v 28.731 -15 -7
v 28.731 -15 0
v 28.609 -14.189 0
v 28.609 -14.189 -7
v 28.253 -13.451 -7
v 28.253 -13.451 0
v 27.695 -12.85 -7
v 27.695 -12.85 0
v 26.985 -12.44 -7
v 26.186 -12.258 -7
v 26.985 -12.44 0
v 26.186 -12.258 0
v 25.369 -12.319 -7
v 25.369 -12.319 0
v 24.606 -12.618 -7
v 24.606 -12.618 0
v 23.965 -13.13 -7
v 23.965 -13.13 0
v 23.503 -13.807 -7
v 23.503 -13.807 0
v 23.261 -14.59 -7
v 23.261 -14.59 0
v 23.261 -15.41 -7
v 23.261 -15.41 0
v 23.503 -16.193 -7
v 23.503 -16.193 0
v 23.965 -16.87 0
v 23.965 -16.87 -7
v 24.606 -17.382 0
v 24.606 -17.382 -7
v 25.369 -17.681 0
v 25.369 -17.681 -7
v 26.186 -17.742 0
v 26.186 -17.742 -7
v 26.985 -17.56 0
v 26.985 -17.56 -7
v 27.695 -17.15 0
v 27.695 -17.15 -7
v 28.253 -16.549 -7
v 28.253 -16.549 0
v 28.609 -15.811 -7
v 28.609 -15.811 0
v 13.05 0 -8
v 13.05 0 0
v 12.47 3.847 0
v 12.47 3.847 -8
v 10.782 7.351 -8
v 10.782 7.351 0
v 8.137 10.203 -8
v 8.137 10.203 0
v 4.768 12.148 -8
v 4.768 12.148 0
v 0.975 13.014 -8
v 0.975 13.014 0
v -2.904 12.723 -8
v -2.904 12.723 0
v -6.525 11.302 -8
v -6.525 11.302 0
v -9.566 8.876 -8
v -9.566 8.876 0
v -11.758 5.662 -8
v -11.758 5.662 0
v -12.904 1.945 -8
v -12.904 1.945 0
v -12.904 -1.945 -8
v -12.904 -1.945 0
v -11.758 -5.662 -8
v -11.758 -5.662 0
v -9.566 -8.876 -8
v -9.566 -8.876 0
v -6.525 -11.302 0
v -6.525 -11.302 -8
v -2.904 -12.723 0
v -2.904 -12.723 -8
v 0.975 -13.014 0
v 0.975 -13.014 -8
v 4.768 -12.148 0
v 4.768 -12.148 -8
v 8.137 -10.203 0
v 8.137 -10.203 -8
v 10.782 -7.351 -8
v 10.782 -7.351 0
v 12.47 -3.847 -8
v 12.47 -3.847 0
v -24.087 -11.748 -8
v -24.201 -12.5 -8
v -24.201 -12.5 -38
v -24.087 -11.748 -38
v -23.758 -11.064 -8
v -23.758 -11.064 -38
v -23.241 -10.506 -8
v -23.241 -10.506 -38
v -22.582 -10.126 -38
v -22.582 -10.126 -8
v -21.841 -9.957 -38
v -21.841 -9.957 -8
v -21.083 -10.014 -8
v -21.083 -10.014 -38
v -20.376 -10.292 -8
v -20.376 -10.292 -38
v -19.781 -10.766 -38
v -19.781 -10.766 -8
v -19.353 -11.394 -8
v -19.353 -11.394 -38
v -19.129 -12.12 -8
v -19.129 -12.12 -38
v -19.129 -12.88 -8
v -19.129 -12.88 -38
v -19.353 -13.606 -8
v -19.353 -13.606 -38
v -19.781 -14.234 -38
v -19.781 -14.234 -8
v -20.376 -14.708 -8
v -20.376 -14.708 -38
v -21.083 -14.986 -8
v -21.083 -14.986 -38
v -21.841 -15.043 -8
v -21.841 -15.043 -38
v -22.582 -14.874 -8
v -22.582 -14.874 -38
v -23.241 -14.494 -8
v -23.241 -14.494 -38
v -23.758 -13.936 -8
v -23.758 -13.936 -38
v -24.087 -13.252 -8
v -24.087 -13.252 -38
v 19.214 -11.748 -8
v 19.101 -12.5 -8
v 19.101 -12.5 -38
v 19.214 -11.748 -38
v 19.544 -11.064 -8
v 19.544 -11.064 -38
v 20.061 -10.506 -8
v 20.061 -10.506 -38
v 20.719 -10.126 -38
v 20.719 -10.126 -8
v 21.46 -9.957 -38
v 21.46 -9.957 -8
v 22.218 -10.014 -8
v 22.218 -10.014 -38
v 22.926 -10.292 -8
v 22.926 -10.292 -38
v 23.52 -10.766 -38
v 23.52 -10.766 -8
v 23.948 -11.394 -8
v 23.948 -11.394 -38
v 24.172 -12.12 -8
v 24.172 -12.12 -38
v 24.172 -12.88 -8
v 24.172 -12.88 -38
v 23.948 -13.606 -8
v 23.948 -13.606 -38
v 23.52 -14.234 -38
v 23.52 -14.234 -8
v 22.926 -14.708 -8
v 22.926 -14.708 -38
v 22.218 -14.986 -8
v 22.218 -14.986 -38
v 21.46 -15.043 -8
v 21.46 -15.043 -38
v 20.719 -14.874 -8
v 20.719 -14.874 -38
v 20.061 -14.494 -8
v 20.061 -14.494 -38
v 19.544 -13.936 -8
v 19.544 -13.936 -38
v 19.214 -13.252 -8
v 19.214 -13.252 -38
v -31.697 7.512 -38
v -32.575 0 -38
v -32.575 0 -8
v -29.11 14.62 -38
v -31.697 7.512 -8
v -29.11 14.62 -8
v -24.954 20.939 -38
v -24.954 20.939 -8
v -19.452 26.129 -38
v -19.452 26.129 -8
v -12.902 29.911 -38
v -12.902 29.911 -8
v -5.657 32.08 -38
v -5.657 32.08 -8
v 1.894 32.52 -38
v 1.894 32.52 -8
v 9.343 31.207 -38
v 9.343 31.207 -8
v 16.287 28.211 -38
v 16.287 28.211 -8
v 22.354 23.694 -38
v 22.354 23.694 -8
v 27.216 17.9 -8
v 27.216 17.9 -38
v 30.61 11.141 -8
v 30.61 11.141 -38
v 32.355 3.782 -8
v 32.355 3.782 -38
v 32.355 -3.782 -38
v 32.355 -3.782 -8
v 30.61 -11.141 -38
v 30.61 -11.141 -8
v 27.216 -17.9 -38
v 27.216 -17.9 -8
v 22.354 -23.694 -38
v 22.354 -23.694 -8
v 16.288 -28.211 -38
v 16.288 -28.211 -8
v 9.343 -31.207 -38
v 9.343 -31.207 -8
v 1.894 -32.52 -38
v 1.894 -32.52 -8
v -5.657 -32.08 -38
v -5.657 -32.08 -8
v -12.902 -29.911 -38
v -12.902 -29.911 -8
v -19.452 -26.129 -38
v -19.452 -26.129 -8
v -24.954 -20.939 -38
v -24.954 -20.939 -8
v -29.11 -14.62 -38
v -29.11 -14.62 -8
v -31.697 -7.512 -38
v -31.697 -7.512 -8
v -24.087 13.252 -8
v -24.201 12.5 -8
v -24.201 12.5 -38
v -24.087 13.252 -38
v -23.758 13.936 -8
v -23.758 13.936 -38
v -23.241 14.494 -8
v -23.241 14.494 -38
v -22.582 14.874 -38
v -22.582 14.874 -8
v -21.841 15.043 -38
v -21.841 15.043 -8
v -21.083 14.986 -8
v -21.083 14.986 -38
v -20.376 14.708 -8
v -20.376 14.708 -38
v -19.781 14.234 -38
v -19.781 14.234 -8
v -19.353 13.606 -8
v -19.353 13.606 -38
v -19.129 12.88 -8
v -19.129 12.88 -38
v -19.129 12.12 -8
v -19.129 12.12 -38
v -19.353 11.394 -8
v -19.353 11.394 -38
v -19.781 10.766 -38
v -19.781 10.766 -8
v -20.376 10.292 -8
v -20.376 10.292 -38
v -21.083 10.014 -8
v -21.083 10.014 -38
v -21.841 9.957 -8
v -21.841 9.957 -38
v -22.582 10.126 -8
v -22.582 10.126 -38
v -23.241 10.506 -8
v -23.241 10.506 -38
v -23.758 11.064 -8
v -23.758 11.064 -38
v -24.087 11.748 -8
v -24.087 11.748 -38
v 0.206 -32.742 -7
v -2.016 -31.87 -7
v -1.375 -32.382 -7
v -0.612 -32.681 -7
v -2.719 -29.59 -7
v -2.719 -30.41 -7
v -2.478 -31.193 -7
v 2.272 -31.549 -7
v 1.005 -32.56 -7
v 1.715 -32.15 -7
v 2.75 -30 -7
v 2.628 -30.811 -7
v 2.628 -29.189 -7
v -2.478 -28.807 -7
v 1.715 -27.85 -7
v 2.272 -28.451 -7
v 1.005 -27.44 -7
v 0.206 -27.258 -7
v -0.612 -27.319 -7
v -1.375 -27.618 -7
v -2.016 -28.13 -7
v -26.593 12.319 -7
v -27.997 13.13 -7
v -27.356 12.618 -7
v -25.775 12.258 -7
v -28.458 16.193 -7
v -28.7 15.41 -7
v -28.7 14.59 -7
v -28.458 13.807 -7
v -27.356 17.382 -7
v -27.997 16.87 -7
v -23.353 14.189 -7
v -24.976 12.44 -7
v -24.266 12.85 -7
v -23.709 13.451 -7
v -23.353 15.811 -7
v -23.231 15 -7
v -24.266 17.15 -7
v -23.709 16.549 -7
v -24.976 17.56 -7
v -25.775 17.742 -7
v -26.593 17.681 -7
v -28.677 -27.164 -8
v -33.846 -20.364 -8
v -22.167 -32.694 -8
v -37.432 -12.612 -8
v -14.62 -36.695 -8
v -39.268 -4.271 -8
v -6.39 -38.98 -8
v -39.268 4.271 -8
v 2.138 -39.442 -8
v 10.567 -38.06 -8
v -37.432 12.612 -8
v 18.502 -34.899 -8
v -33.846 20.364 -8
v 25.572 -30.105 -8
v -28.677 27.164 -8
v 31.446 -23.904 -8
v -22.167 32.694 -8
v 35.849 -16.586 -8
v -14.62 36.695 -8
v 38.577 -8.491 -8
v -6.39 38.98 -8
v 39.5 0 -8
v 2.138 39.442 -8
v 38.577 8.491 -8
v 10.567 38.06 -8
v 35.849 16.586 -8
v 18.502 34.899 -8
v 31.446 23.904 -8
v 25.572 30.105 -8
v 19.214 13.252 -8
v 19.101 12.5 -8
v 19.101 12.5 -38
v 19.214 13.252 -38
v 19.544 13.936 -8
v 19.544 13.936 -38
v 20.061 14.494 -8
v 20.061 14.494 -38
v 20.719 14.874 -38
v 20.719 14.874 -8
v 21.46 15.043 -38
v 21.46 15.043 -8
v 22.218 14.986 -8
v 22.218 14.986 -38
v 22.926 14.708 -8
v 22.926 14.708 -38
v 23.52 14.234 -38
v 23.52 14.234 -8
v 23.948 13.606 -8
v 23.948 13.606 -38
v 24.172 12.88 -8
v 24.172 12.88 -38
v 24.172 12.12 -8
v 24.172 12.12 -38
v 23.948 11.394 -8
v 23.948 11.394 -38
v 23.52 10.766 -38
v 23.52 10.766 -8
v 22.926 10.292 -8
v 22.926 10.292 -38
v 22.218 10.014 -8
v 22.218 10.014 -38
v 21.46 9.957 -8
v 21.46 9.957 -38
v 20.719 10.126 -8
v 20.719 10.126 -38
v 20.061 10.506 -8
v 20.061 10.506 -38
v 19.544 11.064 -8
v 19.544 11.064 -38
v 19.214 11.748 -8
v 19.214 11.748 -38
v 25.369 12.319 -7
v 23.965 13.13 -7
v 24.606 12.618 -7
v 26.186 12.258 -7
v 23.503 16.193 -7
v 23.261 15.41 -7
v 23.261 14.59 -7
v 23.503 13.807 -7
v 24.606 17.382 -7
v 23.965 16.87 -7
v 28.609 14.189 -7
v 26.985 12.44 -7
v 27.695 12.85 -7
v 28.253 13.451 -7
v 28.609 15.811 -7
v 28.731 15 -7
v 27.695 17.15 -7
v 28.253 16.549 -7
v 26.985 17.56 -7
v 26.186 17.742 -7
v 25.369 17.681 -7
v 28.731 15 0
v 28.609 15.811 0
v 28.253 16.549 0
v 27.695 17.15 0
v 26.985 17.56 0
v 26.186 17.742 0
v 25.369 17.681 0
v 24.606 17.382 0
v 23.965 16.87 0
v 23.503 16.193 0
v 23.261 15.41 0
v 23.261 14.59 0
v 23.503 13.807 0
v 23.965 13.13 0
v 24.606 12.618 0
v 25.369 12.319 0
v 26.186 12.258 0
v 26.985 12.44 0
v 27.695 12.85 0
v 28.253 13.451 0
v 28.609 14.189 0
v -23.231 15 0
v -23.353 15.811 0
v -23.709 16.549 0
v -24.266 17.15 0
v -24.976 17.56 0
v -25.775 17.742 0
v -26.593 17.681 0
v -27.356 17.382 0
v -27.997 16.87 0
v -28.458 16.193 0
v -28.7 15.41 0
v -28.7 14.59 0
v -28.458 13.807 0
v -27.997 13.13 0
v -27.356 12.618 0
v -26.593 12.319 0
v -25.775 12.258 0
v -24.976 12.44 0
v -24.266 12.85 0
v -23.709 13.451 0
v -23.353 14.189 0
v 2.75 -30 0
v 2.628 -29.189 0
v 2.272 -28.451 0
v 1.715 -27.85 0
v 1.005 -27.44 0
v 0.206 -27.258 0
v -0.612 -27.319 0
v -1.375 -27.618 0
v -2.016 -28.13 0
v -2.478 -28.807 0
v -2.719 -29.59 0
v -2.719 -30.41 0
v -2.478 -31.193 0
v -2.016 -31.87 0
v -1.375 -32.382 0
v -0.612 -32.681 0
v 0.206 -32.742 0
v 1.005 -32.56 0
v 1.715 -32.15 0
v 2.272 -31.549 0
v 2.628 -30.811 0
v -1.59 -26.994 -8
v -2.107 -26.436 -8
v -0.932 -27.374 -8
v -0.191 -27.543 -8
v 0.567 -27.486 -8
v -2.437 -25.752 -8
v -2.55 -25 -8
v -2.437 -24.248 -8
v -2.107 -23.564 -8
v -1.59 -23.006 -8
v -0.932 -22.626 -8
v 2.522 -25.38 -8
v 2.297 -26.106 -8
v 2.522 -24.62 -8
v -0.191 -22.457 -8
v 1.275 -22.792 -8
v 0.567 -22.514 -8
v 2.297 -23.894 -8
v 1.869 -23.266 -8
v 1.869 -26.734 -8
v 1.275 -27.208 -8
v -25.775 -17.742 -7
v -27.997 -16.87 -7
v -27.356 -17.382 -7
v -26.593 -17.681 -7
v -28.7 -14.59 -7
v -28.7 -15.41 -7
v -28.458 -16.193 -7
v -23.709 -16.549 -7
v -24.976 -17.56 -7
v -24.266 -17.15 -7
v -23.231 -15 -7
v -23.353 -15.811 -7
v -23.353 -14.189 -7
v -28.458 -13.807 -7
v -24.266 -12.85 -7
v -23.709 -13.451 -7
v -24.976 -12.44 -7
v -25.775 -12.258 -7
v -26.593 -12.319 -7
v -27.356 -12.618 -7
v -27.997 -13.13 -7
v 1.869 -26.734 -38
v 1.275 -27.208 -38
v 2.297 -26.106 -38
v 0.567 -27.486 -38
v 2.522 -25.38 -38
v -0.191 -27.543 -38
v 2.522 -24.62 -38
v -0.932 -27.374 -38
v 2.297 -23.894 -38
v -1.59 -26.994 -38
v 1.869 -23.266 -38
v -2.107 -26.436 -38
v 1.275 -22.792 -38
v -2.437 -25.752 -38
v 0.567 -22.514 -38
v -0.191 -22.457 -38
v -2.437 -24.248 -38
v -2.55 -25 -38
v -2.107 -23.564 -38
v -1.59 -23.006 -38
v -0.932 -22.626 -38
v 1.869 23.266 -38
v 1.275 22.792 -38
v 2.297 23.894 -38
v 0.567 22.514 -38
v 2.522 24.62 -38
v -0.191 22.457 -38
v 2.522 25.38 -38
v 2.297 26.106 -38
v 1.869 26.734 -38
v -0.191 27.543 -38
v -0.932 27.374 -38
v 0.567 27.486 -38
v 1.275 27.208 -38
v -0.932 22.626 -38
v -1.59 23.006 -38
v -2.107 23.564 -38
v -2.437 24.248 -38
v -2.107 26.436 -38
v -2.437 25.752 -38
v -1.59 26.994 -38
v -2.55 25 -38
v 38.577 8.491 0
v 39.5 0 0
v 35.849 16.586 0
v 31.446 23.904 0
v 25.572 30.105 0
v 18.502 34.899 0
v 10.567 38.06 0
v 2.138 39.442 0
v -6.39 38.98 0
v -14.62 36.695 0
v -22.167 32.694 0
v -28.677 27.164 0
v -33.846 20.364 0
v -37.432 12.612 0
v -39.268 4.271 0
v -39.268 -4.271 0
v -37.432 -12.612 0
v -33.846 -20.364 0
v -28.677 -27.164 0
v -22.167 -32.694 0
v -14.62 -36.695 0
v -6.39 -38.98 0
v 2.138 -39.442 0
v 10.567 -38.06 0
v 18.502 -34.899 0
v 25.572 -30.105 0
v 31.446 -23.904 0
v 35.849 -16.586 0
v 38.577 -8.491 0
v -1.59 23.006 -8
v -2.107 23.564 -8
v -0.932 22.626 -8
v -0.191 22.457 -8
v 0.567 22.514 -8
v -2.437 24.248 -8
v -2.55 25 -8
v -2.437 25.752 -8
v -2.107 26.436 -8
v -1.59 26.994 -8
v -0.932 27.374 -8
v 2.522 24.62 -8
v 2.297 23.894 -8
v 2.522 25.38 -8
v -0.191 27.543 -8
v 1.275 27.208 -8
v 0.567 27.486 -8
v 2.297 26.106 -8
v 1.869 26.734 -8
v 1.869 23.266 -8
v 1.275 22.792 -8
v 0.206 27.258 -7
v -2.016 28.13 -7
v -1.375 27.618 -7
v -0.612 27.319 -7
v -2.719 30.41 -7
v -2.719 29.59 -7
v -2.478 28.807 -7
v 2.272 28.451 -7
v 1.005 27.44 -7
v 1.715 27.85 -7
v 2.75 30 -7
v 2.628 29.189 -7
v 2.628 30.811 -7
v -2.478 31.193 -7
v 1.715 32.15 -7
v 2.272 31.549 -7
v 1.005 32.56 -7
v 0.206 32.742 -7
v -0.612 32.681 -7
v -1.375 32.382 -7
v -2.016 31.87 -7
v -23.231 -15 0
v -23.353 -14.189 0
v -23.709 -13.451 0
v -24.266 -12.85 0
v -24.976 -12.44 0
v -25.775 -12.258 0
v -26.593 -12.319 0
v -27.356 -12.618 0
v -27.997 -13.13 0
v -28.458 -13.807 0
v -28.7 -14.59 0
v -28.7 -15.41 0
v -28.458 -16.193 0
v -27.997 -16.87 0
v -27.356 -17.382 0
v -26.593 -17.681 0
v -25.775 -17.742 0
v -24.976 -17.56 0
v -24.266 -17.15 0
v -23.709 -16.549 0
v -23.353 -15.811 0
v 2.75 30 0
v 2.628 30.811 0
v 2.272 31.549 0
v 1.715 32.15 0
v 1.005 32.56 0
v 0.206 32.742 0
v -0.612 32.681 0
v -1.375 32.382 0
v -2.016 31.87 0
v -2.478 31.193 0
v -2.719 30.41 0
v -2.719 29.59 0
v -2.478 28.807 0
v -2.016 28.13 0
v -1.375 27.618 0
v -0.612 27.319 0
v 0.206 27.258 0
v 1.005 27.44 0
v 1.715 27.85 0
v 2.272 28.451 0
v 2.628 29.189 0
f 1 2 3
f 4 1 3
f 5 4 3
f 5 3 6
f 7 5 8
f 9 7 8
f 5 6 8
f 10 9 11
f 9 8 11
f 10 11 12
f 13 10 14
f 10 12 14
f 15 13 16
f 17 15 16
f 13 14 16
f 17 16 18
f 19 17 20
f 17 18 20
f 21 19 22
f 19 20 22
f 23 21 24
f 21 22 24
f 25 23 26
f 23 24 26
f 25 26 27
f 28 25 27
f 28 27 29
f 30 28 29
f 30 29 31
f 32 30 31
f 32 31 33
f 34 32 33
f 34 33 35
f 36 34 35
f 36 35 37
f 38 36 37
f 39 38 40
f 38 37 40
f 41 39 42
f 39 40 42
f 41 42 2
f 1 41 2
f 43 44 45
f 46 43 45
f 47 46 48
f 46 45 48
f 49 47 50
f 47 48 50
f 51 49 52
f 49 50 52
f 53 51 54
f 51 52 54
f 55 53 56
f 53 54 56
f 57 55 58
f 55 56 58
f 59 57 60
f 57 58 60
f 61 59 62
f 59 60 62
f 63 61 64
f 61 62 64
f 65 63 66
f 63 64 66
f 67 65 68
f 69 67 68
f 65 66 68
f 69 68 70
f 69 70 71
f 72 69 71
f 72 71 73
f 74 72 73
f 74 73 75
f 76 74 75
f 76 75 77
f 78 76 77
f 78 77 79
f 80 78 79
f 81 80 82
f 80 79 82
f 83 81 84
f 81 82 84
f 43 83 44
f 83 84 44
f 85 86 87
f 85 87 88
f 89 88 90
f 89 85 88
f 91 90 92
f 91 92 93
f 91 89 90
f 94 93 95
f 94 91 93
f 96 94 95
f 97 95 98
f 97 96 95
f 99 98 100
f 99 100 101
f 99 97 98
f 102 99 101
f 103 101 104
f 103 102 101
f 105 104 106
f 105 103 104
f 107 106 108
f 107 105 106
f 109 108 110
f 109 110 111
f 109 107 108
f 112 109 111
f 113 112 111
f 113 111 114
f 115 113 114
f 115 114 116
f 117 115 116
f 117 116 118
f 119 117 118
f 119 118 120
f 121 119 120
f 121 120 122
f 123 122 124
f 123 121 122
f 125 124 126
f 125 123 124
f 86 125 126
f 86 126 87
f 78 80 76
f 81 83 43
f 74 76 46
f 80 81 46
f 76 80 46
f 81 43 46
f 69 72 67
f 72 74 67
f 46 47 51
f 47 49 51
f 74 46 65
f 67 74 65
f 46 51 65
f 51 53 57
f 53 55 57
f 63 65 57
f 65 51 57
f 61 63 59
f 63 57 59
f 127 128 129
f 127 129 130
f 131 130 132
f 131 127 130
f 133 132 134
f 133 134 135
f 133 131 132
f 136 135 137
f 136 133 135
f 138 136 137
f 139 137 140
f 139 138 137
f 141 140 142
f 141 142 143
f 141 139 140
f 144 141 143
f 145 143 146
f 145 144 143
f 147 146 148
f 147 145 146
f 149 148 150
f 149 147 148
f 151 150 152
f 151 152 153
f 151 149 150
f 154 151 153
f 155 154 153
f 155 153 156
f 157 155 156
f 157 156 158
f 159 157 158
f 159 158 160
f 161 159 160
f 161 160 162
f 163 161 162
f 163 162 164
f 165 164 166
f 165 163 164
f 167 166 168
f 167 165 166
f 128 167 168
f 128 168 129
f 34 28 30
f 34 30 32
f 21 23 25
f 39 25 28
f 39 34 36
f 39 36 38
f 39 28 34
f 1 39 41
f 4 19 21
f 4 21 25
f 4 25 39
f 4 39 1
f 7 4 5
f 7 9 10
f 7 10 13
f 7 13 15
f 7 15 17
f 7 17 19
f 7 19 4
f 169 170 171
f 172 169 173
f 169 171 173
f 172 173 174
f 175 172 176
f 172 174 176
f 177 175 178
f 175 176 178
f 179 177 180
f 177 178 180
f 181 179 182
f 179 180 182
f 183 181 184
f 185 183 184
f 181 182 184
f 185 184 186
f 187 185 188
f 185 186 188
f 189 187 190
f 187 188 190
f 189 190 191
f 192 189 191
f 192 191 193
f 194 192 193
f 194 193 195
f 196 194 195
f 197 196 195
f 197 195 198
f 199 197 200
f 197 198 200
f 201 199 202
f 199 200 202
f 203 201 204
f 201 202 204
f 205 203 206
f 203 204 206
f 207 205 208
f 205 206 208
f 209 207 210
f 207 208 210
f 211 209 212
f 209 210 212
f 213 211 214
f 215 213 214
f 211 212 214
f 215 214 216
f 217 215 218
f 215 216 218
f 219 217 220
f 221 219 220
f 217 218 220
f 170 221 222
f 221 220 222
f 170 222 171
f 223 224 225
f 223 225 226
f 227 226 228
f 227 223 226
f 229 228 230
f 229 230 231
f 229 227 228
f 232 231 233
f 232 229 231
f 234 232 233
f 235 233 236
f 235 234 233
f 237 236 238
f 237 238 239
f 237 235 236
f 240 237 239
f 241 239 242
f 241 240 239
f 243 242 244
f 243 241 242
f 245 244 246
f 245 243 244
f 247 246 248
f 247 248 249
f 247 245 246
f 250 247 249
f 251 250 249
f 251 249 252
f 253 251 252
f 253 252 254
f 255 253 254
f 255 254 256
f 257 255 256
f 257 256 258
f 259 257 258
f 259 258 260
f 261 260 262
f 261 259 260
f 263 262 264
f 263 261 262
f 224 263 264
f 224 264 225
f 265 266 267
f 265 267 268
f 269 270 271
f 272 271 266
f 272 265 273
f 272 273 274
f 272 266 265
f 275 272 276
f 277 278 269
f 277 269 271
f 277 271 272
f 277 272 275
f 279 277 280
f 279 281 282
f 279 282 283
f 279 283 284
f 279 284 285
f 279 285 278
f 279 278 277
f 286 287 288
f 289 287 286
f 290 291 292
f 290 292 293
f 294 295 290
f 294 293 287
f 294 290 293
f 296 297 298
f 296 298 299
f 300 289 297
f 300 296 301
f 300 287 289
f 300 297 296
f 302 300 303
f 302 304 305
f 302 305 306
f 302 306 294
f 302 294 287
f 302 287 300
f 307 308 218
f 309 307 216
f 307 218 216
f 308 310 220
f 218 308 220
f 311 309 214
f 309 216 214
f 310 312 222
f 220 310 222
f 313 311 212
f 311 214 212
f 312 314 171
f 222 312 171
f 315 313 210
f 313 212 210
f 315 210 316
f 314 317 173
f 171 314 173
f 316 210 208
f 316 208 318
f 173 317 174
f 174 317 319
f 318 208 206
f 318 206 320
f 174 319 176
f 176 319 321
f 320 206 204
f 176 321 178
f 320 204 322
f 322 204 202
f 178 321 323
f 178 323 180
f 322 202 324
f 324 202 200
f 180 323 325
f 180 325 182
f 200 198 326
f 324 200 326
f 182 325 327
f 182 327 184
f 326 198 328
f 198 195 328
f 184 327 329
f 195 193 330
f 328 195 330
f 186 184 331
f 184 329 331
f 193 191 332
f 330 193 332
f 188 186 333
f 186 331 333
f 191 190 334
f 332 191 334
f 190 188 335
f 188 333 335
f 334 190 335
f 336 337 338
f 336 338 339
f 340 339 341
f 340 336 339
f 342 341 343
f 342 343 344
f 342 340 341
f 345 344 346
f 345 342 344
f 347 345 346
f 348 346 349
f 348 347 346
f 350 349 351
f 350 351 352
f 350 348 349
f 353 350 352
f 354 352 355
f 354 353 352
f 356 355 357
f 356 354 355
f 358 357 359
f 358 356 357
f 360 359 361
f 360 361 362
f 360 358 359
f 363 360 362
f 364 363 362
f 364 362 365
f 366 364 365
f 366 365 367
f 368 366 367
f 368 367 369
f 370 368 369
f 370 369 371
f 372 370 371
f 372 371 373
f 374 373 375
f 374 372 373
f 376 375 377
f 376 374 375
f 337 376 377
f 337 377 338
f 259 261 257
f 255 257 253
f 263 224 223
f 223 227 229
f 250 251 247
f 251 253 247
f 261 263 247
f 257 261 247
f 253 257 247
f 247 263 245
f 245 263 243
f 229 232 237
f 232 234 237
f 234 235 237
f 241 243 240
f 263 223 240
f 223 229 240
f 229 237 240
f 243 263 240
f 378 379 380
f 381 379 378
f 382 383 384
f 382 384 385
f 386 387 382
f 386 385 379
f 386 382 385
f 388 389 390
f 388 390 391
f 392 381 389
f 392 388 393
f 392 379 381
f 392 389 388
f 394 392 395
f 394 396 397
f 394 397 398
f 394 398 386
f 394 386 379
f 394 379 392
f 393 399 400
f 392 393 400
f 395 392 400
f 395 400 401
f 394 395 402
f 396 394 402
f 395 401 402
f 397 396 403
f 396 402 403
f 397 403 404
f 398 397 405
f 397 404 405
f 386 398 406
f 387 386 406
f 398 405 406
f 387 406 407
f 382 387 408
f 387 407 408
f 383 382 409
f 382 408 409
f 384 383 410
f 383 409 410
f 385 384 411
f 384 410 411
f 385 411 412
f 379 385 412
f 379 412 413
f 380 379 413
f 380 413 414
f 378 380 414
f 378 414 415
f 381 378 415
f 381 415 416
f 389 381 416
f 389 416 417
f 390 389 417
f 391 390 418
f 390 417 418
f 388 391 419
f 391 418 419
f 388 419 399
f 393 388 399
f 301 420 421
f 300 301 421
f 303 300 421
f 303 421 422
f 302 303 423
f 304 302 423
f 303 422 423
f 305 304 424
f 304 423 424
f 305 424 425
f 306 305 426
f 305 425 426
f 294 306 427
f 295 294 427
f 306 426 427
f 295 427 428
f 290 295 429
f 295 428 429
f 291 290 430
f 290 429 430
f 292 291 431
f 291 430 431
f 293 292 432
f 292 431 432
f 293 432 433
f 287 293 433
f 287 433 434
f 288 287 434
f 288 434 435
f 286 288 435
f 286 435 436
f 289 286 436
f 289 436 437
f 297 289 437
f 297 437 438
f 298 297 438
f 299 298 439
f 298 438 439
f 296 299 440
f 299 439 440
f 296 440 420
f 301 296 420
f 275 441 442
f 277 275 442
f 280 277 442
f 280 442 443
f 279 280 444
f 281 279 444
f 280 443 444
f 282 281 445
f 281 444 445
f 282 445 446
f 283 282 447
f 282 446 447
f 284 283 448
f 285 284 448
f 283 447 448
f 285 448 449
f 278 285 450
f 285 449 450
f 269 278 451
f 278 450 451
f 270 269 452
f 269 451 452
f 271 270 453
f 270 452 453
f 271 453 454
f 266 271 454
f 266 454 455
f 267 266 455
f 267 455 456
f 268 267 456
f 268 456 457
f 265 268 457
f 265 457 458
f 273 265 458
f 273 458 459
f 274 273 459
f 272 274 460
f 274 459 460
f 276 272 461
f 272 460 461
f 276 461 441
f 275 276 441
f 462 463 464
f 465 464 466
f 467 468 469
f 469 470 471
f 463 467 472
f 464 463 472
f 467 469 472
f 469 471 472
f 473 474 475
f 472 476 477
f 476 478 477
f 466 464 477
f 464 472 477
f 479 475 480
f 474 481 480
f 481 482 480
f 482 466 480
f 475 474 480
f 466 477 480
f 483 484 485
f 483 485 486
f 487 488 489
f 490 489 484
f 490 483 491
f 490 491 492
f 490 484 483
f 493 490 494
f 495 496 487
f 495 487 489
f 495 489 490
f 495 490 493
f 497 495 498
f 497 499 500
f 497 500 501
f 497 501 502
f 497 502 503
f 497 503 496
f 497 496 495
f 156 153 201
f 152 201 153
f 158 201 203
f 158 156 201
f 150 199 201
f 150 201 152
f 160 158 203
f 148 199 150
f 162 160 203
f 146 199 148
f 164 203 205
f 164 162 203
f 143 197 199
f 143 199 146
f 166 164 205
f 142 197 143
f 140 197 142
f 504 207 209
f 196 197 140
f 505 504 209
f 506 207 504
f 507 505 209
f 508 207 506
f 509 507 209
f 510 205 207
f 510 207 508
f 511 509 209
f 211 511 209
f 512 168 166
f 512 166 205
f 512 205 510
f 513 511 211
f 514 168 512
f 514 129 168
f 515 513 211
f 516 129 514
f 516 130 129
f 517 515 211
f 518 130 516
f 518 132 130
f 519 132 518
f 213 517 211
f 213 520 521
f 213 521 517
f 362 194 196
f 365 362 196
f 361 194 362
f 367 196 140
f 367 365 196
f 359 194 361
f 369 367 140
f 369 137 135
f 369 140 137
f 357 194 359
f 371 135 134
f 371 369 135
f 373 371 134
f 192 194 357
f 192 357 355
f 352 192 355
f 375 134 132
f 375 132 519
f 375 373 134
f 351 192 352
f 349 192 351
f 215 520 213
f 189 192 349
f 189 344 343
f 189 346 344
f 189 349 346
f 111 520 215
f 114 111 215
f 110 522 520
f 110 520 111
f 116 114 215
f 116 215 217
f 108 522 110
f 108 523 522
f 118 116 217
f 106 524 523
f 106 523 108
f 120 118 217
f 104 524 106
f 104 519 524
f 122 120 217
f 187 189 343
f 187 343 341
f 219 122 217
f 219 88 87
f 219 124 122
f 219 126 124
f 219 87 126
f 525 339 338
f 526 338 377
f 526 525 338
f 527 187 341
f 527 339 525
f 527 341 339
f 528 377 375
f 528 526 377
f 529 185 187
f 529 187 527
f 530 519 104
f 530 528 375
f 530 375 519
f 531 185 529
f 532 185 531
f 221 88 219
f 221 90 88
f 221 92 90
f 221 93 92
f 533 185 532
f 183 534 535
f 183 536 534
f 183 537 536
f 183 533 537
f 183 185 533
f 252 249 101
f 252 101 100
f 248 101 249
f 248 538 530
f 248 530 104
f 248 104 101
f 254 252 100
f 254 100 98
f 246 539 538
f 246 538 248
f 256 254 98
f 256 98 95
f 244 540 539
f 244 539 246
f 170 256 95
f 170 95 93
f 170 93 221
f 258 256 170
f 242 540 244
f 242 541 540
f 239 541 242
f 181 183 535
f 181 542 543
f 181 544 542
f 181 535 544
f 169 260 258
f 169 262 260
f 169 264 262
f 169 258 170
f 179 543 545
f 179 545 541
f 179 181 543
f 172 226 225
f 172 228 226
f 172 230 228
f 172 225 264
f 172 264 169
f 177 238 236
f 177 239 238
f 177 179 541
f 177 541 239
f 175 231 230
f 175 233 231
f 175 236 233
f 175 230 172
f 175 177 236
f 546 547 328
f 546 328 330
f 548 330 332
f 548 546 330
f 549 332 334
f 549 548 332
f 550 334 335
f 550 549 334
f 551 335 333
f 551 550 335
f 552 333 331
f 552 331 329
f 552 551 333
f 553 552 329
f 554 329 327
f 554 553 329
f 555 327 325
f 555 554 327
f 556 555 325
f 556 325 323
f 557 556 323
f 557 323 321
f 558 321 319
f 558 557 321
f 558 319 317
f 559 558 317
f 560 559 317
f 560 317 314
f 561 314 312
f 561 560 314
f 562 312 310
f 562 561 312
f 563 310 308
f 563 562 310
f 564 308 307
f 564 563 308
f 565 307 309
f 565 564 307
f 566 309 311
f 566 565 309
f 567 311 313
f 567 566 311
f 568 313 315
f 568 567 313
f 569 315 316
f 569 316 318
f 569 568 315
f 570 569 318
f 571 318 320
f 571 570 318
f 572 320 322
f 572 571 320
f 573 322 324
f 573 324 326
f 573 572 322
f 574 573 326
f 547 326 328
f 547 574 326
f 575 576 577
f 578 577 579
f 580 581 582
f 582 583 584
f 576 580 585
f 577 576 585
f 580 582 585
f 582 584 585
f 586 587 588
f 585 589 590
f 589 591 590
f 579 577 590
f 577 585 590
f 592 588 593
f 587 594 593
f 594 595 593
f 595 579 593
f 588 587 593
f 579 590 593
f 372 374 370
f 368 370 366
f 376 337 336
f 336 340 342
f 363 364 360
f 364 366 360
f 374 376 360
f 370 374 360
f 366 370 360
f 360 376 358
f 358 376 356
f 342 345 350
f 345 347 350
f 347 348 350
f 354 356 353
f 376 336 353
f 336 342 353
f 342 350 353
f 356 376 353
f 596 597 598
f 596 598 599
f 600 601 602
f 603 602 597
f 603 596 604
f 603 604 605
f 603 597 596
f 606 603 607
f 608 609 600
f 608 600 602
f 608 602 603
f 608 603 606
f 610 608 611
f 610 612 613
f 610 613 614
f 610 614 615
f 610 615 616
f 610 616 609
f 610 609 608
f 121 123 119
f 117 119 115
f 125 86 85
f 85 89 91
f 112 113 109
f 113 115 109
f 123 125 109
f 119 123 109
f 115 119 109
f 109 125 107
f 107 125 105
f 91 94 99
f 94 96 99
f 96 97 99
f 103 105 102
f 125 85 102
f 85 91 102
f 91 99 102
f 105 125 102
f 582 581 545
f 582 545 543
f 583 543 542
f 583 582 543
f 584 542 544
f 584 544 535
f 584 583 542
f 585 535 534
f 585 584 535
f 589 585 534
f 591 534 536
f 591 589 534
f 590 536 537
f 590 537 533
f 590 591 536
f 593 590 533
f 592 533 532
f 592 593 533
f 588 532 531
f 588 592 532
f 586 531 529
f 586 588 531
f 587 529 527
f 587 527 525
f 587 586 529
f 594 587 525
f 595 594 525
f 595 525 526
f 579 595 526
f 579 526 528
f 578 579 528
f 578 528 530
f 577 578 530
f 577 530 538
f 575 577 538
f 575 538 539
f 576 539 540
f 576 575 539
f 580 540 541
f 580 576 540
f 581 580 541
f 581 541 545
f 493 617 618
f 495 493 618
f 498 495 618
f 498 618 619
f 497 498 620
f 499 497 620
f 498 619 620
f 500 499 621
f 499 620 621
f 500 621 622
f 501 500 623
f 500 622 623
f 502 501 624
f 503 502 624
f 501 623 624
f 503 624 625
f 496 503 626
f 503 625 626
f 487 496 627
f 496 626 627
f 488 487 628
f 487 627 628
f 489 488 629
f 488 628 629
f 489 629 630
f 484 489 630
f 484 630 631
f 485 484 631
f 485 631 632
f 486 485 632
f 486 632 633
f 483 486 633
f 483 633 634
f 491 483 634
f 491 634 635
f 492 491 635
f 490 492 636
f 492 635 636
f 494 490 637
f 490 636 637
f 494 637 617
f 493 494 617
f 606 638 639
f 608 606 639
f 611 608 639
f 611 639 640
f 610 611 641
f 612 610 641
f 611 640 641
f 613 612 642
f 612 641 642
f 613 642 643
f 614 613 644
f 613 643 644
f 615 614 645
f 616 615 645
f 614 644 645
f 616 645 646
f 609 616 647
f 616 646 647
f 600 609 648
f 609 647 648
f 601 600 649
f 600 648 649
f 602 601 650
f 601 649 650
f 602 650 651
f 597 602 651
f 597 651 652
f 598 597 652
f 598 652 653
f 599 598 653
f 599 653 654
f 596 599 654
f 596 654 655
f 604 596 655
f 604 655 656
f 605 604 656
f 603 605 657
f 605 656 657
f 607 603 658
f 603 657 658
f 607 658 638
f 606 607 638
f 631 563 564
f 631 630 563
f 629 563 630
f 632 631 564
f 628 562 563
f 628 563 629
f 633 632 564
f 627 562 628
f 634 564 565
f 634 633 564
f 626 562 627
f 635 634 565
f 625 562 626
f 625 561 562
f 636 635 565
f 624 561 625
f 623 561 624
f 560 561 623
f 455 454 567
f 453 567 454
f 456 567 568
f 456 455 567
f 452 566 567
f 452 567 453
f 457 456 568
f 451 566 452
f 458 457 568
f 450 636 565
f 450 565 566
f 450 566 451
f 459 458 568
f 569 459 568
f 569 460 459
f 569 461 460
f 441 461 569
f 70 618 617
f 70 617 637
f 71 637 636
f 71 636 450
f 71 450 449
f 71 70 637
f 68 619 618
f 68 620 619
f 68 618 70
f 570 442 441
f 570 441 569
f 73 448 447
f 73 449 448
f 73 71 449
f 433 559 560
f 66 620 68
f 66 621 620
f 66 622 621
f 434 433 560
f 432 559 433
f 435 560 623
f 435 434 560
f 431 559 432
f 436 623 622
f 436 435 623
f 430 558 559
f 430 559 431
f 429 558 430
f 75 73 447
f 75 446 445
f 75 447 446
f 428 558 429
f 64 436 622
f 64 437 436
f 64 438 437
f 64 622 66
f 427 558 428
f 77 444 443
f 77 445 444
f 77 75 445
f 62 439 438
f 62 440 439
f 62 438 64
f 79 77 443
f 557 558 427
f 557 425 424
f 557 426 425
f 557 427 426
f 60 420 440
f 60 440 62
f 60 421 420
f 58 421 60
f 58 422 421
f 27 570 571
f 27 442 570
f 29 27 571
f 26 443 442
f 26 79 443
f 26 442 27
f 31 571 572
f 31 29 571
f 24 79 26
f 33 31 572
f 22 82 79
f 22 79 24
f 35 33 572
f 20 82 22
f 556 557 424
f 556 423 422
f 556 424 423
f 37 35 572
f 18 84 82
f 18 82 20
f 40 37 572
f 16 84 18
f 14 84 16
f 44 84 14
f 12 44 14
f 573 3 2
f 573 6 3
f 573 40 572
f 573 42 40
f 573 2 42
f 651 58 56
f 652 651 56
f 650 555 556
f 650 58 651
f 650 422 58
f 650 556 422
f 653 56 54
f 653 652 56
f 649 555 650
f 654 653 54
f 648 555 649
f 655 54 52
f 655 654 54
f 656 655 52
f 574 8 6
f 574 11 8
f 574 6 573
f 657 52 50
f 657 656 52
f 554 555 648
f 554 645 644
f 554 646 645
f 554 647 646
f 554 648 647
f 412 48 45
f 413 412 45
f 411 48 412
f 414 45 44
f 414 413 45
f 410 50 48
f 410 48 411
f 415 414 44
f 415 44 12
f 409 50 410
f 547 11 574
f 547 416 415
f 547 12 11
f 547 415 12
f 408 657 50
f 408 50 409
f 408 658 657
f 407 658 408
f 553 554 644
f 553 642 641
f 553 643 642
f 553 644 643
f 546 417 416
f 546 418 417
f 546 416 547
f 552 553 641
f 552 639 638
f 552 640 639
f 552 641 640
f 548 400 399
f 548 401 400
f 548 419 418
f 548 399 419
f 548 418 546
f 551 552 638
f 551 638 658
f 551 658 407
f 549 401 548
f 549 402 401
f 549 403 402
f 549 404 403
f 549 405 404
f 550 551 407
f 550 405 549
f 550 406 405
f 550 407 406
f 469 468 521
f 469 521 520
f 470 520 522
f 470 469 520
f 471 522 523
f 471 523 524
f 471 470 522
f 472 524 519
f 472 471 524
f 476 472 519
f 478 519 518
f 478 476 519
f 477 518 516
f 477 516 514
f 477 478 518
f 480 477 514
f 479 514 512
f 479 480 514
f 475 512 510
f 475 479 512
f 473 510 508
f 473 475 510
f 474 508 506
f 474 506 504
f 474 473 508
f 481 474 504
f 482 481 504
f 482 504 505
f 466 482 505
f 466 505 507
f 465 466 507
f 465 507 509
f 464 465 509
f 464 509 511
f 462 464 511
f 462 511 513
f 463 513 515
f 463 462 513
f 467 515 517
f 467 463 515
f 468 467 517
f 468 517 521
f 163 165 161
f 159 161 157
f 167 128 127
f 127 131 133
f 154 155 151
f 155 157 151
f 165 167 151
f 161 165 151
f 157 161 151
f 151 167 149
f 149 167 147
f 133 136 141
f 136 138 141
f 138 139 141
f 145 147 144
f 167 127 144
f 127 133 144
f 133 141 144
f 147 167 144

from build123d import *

# Parameters (mm, degrees)
SKETCH1_R           = 39.5
SKETCH1_R_2         = 13.05
BOSS_EXTRUDE1_DEPTH = 8
SKETCH2_R           = 32.575
SKETCH2_R_2         = 2.55
BOSS_EXTRUDE3_DEPTH = 30
SKETCH1_5_R         = 2.75
CUT_EXTRUDE1_DEPTH  = 7


with BuildPart() as part:
    # Sketch1 → Boss-Extrude1 (new body)
    with BuildSketch(Plane.XY):
        Circle(SKETCH1_R)
        Circle(SKETCH1_R_2, mode=Mode.SUBTRACT)
    extrude(amount=-BOSS_EXTRUDE1_DEPTH)

    # Sketch2 → Boss-Extrude3 (add)
    with BuildSketch(Plane(origin=(0, 0, -8), x_dir=(-1, 0, 0), z_dir=(0, 0, -1))):
        Circle(SKETCH2_R)
        with Locations((0, 25)):
            Circle(SKETCH2_R_2, mode=Mode.SUBTRACT)
        with Locations((21.650635095, 12.5)):
            Circle(SKETCH2_R_2, mode=Mode.SUBTRACT)
        with Locations((21.650635095, -12.5)):
            Circle(SKETCH2_R_2, mode=Mode.SUBTRACT)
        with Locations((0, -25)):
            Circle(SKETCH2_R_2, mode=Mode.SUBTRACT)
        with Locations((-21.650635095, -12.5)):
            Circle(SKETCH2_R_2, mode=Mode.SUBTRACT)
        with Locations((-21.650635095, 12.5)):
            Circle(SKETCH2_R_2, mode=Mode.SUBTRACT)
    extrude(amount=BOSS_EXTRUDE3_DEPTH)

    # Sketch1_5 → Cut-Extrude1 (cut)
    with BuildSketch(Plane.XY):
        with Locations((-25.980762114, 15)):
            Circle(SKETCH1_5_R)
        with Locations((25.980762114, 15)):
            Circle(SKETCH1_5_R)
        with Locations((25.980762114, -15)):
            Circle(SKETCH1_5_R)
        with Locations((0, -30)):
            Circle(SKETCH1_5_R)
        with Locations((-25.980762114, -15)):
            Circle(SKETCH1_5_R)
        with Locations((0, 30)):
            Circle(SKETCH1_5_R)
    extrude(amount=-CUT_EXTRUDE1_DEPTH, mode=Mode.SUBTRACT)


solid = part.part
